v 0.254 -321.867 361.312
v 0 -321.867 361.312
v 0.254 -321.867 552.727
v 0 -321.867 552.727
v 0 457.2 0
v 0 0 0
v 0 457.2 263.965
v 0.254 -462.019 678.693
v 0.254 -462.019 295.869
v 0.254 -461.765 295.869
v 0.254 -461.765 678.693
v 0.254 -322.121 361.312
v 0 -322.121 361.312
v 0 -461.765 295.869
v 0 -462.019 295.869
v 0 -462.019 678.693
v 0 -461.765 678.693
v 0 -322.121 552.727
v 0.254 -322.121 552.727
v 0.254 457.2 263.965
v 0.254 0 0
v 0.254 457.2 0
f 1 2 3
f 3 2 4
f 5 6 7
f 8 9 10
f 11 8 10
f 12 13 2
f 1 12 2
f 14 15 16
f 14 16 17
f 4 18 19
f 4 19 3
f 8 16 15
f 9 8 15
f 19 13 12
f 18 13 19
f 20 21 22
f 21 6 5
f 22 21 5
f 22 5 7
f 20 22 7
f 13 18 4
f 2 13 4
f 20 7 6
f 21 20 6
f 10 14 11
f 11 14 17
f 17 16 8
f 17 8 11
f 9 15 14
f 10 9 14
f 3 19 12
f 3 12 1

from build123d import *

# Parameters (mm, degrees)
F1_DEPTH = 0.254
F2_W     = 0.254
F2_H     = 191.41186
F3_DEPTH = 0.254
F4_W     = 0.254
F4_H     = 191.4144
F5_DEPTH = 0.254


with BuildPart() as f1:
    # F0 (on Right) → F1 (new body)
    with BuildSketch(Plane.YZ):
        Polygon((457.2, 263.964543), (0, 0), (457.2, 0), align=None)
    extrude(amount=F1_DEPTH)


with BuildPart() as f3:
    # F2 (on Right) → F3 (new body)
    with BuildSketch(Plane.YZ):
        with Locations((-461.891983, 391.574835)):
            Rectangle(F2_W, F2_H)
        with Locations((-461.891983, 582.986695)):
            Rectangle(F2_W, F2_H)
    extrude(amount=F3_DEPTH)


with BuildPart() as f5:
    # F4 (on Right) → F5 (new body)
    with BuildSketch(Plane.YZ):
        with Locations((-321.993692, 457.019314)):
            Rectangle(F4_W, F4_H)
    extrude(amount=F5_DEPTH)


solid = Compound([f1.part, f3.part, f5.part])
